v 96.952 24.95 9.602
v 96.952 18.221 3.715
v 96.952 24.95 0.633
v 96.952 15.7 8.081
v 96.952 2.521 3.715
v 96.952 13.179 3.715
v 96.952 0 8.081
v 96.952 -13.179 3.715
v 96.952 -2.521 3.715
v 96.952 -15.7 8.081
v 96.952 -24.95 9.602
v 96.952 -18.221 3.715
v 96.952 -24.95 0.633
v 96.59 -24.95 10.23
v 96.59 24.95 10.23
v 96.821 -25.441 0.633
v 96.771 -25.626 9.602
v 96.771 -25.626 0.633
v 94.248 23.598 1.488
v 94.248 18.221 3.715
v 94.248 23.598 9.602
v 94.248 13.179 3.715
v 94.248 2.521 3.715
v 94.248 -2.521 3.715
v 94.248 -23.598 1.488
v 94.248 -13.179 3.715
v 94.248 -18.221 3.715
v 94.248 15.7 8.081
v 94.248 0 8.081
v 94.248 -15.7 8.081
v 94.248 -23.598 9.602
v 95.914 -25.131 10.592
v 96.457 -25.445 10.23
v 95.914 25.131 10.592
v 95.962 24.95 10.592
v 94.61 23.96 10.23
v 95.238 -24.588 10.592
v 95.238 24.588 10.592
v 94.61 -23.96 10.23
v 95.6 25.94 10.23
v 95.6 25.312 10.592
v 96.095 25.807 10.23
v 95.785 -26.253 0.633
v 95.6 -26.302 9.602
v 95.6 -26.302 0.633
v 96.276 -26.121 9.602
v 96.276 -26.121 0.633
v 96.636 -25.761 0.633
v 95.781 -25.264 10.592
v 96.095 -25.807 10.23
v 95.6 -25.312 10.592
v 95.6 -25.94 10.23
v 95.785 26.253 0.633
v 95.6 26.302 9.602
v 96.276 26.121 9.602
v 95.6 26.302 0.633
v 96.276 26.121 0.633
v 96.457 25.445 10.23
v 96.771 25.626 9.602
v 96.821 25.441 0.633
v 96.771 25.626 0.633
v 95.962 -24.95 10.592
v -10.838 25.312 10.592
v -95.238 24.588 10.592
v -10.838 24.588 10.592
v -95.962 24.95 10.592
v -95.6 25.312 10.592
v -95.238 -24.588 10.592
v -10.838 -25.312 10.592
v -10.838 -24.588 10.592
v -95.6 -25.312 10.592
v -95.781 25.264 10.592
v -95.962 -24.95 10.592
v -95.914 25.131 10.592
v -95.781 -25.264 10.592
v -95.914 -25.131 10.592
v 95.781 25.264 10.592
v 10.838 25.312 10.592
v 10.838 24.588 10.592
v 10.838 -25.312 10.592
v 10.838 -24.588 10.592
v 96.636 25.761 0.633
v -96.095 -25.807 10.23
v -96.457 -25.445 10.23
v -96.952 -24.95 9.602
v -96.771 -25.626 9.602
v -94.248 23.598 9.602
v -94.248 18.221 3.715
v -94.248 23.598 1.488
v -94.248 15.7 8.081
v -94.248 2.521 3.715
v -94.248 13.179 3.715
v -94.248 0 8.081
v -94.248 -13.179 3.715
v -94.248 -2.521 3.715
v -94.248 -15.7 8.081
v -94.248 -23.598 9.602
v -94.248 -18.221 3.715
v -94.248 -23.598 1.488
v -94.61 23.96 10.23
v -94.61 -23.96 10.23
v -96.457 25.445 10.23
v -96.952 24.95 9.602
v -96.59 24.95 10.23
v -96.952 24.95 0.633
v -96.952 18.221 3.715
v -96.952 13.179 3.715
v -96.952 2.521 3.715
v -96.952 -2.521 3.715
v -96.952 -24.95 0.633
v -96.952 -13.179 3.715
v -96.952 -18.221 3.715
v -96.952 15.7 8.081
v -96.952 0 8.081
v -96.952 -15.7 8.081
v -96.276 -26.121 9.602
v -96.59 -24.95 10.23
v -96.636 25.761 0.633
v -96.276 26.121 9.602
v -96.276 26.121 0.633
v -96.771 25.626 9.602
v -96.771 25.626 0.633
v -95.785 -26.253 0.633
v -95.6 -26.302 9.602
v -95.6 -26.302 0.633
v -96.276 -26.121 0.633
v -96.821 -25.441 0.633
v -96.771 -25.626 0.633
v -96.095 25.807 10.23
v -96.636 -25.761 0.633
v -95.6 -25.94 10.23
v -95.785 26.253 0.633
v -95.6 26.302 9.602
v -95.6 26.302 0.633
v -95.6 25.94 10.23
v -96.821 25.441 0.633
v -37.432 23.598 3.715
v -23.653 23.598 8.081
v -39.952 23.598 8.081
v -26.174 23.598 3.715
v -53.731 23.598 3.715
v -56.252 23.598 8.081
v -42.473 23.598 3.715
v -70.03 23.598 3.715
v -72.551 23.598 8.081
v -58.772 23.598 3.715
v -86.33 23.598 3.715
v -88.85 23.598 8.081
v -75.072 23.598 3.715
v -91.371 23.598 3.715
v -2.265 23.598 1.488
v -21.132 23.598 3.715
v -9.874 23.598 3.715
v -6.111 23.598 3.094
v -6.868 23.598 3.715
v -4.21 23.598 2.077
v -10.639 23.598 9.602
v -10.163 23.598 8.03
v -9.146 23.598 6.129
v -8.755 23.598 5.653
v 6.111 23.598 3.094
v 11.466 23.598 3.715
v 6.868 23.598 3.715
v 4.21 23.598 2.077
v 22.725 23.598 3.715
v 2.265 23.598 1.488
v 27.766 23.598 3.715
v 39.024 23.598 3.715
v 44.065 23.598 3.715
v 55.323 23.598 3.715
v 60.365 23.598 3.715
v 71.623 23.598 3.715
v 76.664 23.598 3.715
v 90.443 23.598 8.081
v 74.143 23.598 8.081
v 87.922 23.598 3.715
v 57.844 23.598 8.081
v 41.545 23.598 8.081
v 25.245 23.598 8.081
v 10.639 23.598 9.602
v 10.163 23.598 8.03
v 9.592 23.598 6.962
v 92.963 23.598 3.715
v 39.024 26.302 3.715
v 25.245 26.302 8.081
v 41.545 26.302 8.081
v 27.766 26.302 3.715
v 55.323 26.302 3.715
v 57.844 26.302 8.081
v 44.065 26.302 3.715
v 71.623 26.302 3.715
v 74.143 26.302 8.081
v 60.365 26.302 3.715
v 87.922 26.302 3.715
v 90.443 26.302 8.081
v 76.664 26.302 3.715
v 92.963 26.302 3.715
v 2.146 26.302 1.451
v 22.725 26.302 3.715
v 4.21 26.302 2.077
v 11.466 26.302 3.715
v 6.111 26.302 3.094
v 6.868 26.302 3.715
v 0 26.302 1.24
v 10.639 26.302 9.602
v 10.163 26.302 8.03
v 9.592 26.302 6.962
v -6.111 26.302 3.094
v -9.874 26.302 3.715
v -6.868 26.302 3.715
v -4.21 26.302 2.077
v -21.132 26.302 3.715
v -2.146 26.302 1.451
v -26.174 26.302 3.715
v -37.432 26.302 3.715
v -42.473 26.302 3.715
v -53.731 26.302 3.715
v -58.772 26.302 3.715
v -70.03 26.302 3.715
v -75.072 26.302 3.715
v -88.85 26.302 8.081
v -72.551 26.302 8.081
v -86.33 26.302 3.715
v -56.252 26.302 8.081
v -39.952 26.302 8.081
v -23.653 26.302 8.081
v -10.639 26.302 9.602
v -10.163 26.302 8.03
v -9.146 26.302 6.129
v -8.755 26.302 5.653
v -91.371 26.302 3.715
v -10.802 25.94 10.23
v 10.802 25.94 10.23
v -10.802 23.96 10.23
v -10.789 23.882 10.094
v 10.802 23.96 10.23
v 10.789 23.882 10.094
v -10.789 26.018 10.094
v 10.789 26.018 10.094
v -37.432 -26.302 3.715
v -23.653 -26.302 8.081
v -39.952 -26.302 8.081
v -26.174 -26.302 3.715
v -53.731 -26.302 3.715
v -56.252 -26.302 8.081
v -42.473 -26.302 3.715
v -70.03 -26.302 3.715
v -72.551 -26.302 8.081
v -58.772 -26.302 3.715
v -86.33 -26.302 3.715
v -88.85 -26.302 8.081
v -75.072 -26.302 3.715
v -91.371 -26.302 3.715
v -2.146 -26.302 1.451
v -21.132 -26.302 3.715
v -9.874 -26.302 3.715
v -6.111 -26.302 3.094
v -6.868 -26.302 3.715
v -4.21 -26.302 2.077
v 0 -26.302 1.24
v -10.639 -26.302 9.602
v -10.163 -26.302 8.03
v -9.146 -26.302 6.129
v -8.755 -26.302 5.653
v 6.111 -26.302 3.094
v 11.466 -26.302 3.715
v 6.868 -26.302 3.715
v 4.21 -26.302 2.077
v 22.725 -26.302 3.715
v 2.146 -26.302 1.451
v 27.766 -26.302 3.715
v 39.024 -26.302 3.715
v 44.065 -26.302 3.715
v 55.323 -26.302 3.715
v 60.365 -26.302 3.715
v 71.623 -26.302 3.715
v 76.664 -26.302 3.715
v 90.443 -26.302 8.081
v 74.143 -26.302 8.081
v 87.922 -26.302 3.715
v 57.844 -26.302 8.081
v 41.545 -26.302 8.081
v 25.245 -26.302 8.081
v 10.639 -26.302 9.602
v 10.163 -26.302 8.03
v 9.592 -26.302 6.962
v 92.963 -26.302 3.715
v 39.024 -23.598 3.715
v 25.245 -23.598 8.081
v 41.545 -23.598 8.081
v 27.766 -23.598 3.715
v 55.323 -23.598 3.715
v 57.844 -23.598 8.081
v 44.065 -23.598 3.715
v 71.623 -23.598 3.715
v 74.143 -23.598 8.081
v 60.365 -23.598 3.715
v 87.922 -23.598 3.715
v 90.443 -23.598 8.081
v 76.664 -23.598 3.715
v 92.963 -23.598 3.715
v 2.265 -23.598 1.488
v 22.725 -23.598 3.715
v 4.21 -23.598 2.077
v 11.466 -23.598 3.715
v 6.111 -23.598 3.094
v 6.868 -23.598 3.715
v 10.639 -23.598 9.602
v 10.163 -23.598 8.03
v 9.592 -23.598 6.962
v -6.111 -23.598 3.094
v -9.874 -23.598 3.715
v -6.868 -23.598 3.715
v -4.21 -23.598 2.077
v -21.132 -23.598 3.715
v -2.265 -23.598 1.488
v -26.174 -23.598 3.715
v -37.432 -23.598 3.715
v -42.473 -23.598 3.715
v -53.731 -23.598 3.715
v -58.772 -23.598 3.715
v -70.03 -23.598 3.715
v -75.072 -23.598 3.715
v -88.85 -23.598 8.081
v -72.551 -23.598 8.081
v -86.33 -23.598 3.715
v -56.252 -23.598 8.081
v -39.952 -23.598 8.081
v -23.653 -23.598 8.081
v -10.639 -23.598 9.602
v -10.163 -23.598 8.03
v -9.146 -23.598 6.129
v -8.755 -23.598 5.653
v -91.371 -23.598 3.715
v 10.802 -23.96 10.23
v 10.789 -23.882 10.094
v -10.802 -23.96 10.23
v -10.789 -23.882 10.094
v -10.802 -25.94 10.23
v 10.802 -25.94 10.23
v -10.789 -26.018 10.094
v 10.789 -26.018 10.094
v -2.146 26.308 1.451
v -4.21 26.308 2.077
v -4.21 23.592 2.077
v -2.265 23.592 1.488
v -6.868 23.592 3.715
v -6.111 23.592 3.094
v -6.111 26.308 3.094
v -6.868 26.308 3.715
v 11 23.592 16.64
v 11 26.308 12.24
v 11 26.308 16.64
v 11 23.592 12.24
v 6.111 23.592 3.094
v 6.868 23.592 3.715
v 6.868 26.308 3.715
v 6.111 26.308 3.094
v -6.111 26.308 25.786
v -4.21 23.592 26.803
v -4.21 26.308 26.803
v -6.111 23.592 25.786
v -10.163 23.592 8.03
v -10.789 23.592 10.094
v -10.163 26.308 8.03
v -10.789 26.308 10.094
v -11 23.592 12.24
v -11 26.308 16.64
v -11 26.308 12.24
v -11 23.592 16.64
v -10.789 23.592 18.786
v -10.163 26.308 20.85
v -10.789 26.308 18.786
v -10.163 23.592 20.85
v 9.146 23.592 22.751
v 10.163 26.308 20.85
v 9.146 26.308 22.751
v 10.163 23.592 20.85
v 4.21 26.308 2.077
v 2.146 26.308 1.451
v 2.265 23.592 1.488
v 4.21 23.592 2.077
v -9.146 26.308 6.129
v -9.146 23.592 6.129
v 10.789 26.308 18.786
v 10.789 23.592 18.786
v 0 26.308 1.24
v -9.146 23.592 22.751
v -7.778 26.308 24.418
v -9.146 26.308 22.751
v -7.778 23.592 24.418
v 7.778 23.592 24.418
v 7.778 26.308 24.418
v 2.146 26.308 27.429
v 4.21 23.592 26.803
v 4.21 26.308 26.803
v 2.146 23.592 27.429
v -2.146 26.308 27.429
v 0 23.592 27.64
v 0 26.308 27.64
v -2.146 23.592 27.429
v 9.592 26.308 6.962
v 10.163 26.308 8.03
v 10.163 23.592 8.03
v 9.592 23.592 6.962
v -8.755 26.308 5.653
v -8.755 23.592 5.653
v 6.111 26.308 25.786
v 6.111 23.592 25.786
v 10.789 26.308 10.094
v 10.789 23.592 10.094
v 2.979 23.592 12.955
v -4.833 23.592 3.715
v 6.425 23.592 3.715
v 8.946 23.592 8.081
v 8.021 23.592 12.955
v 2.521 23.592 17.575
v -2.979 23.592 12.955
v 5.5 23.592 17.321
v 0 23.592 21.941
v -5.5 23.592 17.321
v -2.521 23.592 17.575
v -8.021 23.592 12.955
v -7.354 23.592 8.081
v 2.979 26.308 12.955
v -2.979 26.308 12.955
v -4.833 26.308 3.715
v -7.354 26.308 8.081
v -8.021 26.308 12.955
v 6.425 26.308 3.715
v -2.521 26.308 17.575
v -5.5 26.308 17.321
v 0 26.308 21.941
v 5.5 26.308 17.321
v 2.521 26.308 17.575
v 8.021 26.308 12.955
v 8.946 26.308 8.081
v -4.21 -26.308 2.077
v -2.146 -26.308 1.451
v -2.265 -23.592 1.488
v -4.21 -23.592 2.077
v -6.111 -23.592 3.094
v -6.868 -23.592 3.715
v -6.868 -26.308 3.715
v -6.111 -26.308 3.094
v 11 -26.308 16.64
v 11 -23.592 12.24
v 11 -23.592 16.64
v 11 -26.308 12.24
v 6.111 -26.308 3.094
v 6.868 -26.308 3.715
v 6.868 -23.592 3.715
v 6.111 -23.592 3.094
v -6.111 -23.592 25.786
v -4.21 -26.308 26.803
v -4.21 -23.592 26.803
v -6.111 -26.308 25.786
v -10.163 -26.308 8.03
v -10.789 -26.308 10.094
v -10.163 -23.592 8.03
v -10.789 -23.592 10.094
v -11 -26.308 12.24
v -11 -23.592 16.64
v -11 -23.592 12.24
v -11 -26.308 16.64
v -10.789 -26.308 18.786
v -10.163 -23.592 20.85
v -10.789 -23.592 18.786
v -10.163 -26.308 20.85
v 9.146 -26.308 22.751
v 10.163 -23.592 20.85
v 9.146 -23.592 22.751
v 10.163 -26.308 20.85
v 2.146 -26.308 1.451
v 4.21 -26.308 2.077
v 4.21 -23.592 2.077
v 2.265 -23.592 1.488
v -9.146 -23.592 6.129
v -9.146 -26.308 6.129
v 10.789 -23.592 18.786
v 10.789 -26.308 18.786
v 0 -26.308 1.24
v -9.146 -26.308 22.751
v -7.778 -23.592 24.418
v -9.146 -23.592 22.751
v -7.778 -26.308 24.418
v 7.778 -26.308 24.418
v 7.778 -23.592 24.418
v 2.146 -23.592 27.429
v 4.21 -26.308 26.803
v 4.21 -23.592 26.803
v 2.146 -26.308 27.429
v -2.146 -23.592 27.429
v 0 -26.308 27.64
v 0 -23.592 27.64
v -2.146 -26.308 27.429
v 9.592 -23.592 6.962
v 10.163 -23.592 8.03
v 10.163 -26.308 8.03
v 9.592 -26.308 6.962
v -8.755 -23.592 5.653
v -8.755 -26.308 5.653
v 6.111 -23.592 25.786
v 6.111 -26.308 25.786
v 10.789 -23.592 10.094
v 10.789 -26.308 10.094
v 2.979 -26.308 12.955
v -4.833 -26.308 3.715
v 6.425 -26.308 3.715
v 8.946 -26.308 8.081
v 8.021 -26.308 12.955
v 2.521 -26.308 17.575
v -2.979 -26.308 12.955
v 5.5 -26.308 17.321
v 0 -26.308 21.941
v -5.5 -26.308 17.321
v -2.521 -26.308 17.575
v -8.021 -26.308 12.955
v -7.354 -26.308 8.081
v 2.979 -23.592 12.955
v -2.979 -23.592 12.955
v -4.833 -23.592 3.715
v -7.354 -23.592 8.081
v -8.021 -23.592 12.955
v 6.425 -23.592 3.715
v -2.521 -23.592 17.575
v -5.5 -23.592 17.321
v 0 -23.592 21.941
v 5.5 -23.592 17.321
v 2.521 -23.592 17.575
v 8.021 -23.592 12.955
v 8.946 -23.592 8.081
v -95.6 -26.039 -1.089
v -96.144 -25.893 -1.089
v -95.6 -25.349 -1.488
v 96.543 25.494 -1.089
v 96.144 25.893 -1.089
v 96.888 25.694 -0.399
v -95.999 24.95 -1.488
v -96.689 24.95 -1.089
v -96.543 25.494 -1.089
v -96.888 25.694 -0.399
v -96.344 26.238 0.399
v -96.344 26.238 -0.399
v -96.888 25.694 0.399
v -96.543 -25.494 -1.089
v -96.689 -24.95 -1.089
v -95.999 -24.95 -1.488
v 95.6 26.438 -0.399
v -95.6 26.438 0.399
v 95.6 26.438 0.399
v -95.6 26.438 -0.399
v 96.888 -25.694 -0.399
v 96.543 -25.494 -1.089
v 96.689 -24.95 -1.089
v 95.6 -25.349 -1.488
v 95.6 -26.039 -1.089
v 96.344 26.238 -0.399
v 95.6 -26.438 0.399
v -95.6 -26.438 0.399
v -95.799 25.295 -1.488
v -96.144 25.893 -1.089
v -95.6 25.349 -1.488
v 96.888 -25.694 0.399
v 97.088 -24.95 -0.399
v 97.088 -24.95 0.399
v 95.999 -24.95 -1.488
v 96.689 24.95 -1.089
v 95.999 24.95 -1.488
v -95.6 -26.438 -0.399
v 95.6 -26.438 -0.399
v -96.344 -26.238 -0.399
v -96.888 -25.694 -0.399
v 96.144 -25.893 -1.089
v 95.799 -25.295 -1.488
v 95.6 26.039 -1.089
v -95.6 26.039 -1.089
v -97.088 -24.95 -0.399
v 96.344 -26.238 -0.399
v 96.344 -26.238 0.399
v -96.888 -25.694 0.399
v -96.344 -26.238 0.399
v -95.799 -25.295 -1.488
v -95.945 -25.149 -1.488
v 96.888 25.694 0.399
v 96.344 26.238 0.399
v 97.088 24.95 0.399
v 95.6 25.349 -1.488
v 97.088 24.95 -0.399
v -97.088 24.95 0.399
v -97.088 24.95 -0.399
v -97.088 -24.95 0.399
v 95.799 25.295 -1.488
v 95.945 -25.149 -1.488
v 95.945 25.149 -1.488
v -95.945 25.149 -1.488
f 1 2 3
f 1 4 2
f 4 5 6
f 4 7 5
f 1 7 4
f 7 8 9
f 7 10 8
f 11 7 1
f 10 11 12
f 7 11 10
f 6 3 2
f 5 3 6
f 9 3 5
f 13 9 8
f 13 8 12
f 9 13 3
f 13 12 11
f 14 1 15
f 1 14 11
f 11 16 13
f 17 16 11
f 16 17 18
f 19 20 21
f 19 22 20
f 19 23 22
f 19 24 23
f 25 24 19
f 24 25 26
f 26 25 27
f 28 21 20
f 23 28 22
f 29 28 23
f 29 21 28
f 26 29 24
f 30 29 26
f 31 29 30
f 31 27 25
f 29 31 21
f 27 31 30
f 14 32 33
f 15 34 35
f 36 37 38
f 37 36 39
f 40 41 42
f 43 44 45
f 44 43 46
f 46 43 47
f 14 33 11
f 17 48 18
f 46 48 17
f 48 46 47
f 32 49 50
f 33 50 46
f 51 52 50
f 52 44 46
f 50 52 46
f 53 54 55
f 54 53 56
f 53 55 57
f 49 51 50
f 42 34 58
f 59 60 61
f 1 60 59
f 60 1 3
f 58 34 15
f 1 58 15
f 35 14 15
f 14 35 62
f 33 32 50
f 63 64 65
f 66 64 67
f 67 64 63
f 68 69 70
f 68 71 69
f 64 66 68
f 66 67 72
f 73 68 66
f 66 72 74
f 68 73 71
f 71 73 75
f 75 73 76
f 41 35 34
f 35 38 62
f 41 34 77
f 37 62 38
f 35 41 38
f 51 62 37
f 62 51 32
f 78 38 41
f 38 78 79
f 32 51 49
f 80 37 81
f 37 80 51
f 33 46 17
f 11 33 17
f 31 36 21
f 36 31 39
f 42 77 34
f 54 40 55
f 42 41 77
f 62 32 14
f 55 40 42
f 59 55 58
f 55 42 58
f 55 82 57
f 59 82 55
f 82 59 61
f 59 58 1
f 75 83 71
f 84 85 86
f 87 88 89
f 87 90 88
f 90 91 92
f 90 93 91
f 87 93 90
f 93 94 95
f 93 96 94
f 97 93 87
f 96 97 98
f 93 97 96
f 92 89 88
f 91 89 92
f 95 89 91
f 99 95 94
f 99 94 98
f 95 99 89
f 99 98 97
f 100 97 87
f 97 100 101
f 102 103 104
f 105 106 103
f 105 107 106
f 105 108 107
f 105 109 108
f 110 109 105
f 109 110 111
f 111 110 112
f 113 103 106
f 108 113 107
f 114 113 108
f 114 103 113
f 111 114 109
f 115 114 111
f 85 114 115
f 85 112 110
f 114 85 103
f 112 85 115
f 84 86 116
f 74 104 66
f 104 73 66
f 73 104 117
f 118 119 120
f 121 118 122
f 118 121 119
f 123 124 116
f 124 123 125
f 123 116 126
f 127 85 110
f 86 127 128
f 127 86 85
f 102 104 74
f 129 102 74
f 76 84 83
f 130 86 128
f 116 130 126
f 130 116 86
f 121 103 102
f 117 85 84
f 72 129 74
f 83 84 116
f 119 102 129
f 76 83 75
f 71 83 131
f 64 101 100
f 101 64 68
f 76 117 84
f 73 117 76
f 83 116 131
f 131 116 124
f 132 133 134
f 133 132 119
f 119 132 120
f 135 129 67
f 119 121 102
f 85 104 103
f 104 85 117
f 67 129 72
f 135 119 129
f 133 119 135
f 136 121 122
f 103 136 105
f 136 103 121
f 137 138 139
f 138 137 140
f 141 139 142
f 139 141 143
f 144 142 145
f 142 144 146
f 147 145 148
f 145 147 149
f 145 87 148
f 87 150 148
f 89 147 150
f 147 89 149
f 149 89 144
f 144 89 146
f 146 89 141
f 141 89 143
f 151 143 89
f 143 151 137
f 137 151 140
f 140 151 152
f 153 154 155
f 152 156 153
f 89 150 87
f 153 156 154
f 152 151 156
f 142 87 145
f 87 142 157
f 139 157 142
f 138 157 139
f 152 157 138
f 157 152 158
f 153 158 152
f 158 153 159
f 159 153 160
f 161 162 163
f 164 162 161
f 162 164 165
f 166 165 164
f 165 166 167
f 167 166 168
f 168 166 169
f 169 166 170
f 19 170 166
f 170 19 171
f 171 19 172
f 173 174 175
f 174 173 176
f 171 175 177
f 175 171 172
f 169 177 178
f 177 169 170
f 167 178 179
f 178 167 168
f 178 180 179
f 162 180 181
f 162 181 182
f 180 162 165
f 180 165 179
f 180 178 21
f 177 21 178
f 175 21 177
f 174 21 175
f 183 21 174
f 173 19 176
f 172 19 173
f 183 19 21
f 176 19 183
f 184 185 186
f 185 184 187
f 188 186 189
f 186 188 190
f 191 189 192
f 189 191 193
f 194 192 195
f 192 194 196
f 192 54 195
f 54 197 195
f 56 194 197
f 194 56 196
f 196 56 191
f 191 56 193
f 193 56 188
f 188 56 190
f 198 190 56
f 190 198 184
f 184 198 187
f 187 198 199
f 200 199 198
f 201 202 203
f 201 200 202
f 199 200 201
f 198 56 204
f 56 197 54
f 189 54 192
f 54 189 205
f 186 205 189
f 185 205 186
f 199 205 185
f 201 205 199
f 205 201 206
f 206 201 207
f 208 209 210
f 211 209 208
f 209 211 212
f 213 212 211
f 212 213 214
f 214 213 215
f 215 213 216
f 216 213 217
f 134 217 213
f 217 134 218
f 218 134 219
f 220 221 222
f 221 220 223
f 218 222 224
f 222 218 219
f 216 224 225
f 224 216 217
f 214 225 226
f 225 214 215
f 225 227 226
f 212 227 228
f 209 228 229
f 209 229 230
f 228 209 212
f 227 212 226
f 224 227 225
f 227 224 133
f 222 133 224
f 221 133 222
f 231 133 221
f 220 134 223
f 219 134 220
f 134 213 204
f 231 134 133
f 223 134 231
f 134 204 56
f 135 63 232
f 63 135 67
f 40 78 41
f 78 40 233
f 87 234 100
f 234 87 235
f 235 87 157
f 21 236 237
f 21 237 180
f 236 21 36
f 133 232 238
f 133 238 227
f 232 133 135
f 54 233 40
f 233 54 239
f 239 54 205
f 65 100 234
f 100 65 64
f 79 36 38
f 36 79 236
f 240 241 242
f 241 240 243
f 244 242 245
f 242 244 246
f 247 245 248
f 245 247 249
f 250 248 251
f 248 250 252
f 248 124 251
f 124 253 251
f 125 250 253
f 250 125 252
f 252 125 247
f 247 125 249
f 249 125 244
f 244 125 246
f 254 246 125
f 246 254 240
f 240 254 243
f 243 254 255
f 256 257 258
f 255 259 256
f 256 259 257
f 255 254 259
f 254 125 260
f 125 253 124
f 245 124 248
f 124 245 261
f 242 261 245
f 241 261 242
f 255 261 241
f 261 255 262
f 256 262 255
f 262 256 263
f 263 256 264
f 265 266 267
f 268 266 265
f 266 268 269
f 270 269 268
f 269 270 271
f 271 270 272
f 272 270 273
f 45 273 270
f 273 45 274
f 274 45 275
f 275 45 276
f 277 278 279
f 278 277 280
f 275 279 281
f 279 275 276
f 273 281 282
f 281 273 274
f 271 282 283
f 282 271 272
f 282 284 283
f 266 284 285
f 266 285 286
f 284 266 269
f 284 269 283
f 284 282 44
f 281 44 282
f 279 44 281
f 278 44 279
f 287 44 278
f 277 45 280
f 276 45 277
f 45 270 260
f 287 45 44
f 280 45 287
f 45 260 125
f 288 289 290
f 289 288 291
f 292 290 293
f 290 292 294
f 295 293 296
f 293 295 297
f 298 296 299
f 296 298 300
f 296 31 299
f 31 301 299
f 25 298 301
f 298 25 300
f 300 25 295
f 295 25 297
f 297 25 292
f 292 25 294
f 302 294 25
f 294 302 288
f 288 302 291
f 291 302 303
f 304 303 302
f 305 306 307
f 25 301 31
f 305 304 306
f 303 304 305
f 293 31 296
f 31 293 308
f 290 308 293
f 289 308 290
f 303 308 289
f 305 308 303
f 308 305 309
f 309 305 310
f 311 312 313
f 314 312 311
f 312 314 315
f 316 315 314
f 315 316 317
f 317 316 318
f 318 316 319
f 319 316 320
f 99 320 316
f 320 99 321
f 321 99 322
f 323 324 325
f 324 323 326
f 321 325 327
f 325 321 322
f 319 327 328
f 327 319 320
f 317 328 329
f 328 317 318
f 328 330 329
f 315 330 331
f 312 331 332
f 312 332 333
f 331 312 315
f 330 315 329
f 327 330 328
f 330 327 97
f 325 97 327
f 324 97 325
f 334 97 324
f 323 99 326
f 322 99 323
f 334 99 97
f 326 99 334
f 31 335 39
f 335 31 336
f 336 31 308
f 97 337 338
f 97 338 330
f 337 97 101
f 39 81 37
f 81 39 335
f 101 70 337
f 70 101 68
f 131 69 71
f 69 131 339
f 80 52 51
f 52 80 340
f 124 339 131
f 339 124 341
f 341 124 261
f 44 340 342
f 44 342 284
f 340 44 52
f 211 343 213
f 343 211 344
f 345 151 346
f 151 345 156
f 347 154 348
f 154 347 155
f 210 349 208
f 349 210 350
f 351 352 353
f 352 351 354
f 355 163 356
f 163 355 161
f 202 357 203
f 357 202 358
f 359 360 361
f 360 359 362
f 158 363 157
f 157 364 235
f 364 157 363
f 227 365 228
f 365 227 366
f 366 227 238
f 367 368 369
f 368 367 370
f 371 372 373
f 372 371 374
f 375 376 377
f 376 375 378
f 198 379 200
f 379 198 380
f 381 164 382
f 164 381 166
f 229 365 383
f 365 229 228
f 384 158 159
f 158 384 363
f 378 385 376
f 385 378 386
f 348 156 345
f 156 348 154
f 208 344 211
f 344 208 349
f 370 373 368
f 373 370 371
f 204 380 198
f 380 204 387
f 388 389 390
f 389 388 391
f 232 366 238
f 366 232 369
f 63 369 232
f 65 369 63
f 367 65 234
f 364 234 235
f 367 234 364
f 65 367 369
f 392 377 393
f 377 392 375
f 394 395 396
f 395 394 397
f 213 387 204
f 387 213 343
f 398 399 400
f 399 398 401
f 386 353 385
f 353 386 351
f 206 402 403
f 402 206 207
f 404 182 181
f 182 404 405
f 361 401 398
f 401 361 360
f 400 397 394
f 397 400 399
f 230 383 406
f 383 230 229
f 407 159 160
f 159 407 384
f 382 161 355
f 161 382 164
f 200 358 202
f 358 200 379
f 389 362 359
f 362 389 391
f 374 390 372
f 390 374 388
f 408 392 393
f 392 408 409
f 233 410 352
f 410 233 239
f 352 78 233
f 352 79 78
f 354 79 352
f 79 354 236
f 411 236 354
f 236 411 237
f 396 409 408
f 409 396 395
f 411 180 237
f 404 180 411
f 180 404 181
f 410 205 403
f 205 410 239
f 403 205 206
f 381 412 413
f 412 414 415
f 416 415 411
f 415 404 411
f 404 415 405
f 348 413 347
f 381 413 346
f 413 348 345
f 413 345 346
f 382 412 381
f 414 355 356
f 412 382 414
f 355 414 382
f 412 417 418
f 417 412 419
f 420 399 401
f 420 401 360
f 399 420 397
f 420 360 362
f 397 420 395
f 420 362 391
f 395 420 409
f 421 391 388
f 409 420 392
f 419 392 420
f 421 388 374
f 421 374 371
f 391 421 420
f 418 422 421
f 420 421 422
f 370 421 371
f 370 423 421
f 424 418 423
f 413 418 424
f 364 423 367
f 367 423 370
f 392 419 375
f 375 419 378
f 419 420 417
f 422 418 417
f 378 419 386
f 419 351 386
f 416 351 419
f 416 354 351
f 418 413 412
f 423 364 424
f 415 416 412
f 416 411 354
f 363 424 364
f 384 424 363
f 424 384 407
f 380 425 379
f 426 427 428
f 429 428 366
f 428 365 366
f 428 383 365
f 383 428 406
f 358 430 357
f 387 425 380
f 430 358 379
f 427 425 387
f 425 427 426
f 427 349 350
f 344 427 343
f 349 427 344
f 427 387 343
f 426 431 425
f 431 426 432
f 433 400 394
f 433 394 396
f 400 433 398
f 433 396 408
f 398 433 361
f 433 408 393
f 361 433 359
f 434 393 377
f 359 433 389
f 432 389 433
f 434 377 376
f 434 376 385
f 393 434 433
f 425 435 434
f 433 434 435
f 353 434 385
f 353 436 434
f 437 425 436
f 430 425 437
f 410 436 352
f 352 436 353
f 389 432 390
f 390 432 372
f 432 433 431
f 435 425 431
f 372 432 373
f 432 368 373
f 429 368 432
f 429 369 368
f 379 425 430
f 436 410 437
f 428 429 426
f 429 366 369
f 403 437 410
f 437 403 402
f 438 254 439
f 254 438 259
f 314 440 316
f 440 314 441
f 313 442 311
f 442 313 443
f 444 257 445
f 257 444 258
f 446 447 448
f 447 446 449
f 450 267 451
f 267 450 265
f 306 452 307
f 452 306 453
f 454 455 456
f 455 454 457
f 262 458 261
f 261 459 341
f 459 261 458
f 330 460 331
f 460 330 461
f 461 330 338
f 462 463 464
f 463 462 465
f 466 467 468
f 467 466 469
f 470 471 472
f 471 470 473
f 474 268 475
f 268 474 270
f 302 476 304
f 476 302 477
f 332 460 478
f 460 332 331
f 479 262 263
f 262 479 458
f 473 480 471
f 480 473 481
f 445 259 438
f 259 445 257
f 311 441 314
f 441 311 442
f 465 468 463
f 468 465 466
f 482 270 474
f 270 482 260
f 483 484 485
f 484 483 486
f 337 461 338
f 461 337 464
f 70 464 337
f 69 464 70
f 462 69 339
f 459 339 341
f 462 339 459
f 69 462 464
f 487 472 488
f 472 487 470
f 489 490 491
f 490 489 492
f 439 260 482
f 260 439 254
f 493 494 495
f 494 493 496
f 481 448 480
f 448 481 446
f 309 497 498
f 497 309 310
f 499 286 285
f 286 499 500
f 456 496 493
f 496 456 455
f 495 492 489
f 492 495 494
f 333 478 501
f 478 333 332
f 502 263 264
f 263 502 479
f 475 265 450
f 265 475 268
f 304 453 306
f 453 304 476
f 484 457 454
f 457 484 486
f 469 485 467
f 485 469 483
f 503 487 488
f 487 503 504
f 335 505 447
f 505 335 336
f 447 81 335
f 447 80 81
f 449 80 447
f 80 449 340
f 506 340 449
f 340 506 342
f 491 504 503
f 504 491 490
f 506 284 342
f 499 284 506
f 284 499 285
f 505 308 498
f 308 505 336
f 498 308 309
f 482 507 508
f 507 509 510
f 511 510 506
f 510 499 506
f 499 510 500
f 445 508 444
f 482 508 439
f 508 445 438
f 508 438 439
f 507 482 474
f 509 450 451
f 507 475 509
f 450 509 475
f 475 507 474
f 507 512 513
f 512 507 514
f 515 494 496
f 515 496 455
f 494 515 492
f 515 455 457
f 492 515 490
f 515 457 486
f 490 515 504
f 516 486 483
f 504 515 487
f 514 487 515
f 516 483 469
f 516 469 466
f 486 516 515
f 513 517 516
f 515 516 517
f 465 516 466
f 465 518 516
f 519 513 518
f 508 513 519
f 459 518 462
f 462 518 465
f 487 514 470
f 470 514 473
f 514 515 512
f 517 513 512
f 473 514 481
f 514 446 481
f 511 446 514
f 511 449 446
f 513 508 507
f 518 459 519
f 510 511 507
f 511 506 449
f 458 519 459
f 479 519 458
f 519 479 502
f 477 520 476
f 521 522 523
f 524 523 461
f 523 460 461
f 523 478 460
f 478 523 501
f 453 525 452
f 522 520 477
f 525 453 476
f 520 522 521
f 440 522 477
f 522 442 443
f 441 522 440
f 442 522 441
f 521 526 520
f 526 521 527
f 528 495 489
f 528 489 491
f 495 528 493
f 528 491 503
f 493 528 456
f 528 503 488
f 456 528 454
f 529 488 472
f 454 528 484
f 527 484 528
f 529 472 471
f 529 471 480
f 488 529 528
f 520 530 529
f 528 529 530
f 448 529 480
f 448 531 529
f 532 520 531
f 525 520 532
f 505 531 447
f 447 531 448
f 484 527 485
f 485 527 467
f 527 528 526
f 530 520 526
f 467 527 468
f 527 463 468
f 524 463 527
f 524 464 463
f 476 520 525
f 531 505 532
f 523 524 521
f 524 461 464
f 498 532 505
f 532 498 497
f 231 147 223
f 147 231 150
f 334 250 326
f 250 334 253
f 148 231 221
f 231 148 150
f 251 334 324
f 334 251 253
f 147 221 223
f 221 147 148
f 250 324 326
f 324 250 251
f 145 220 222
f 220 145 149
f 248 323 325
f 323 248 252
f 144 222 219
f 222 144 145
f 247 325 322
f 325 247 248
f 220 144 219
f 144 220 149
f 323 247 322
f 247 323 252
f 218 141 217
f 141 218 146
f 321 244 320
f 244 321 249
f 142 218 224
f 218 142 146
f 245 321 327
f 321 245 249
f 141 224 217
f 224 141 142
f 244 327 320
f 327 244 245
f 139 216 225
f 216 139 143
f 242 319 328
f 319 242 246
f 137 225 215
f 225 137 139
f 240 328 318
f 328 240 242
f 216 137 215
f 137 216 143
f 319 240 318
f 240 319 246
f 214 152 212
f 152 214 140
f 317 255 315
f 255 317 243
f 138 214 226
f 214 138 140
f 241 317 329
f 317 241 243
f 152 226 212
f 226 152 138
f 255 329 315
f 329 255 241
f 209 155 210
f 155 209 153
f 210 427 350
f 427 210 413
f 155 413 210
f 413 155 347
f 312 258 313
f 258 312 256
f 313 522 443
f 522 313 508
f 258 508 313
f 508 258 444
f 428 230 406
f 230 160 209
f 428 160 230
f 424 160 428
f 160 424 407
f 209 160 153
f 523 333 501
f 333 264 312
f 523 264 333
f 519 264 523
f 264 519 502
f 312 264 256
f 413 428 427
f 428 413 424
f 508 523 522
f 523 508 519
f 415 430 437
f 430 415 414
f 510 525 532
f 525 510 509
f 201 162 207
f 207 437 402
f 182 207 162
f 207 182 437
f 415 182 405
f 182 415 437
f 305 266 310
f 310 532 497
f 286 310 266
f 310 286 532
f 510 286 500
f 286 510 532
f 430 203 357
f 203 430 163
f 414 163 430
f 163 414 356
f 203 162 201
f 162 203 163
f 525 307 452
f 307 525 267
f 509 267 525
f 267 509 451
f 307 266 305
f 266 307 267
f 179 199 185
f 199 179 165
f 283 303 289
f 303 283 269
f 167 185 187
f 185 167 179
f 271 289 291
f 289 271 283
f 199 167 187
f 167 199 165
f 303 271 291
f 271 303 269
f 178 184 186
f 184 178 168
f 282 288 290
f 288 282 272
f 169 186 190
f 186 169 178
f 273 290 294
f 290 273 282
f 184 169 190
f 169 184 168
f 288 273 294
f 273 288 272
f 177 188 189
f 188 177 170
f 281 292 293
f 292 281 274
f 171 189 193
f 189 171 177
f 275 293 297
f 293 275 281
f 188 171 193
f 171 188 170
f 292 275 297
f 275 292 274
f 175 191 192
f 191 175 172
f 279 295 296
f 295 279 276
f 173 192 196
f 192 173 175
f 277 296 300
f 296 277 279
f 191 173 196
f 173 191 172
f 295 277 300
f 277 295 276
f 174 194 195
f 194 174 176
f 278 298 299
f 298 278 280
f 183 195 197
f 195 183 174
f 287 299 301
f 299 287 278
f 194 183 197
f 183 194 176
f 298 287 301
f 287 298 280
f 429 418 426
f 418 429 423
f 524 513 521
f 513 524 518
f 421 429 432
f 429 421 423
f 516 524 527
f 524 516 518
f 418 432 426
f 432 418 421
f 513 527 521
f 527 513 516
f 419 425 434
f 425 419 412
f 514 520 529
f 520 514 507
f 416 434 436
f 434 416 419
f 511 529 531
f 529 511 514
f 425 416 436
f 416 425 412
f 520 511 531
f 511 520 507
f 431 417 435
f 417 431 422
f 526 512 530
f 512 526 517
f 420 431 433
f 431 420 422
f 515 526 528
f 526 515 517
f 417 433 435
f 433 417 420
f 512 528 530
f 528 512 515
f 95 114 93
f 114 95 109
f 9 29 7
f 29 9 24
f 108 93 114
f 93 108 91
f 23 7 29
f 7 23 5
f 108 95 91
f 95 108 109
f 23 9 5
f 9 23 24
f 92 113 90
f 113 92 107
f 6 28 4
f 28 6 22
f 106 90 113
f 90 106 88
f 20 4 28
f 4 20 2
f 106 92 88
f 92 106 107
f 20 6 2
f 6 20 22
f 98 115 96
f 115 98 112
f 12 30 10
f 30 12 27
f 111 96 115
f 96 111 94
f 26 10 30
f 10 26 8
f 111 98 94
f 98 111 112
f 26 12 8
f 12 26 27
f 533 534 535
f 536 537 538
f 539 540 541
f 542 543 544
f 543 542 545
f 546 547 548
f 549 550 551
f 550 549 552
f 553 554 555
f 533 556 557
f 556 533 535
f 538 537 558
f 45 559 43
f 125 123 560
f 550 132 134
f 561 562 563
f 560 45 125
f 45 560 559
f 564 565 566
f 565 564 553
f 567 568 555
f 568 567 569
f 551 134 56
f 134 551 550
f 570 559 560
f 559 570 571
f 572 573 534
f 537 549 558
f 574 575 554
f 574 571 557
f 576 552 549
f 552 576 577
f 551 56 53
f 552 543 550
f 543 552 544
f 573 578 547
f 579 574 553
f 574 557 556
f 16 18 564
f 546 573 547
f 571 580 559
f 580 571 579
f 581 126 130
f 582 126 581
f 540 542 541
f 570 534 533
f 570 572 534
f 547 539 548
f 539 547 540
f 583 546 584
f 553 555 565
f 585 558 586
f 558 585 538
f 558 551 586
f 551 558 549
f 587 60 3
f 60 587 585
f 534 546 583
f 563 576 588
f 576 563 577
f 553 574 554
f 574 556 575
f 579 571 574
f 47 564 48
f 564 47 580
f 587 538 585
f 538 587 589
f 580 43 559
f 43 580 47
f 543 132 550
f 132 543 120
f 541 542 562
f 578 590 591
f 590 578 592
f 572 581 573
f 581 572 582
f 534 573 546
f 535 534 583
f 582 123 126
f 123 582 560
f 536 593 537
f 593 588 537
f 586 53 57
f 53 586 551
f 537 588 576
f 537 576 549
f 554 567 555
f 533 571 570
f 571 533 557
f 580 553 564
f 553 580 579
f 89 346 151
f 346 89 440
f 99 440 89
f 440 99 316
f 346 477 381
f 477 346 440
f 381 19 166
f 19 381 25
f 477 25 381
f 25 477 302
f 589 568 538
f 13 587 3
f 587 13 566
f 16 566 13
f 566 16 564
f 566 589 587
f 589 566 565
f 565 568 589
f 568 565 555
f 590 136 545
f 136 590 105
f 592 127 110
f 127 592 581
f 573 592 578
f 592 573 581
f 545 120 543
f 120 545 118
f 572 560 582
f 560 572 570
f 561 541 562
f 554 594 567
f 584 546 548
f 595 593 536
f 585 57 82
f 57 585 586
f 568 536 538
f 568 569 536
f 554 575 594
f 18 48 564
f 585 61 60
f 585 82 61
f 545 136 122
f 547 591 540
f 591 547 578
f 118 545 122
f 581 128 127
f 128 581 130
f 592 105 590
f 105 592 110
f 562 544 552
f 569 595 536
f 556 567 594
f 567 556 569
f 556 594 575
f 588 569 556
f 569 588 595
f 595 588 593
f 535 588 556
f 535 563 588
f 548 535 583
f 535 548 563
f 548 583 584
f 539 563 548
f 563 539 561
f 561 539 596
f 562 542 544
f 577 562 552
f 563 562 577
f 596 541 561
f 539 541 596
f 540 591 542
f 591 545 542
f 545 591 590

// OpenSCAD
//
// blockbox.scad

// 12 blocks by 3
//
// block height  33mm
//       side    15mm

// unit is mm

$fn=12;


block_height = 33;
block_side = 15;

wall_thickness = 2.8;
wall_height = block_height * 0.28;

gap = 0.70;
box_in_length = 12 * (block_side + gap);
box_ex_length = box_in_length + 2 * wall_thickness;

box_in_width = 3 * (block_side + gap);
box_ex_width = box_in_width + 2 * wall_thickness;

echo("box_in_width", box_in_width);
echo("box_in_length", box_in_length);

border_radius = wall_thickness / 2 * 1.1;

wt2 = wall_thickness / 2;
el2 = box_ex_length * 0.5 - wt2;
ew2 = box_ex_width * 0.5 - wt2;


hull() { // bottom
  translate([  el2,  ew2, 0 ]) sphere(r=border_radius);
  translate([  el2, -ew2, 0 ]) sphere(r=border_radius);
  translate([ -el2,  ew2, 0 ]) sphere(r=border_radius);
  translate([ -el2, -ew2, 0 ]) sphere(r=border_radius);
};

rad = wall_height * 0.63 / 2;

module remo0() {
  dh = border_radius / 2.8 + wall_height / 2;
  l = box_ex_length * 1.1;
  translate([ 0, l / 2, dh ]) rotate([ 90, 30, 0 ]) cylinder(r=rad, h=l, $fn=3);
  //translate([ 0, l / 2, dh ]) rotate([ 90, 0, 0 ]) cylinder(r=rad, h=l, $fn=12);
  //translate([ 0, l / 2, dh * 0.8 ]) rotate([ 90, 45, 0 ]) cylinder(r=rad, h=l, $fn=4);
};
module remo1() {
  rotate([ 0, 0, 90 ]) remo0();
}

handle_radius = 11;

module handle() {

  wh = wall_height + 3;
  hh = block_height * 0.8 - handle_radius * 2;

  hull() {
    translate([ 0, 0, wh ]) rotate([ 90, 0, 0 ])
      cylinder(r=handle_radius, h=wall_thickness * 0.97, $fn=32, center=true);
    translate([ 0, 0, wh + hh ]) rotate([ 90, 0, 0 ])
      cylinder(r=handle_radius, h=wall_thickness * 0.97, $fn=32, center=true);
  }
};

difference() {
  union() {
    hull() {
      translate([ el2,  ew2, 0 ]) sphere(r=wt2);
      translate([ el2, -ew2, 0 ]) sphere(r=wt2);
      translate([ el2,  ew2, wall_height ]) sphere(r=wt2);
      translate([ el2, -ew2, wall_height ]) sphere(r=wt2);
    };
    hull() {
      translate([ -el2,  ew2, 0 ]) sphere(r=wt2);
      translate([ -el2, -ew2, 0 ]) sphere(r=wt2);
      translate([ -el2,  ew2, wall_height ]) sphere(r=wt2);
      translate([ -el2, -ew2, wall_height ]) sphere(r=wt2);
    };
    hull() {
      translate([  el2,  ew2, 0 ]) sphere(r=wt2);
      translate([ -el2,  ew2, 0 ]) sphere(r=wt2);
      translate([  el2,  ew2, wall_height ]) sphere(r=wt2);
      translate([ -el2,  ew2, wall_height ]) sphere(r=wt2);
    };
    hull() {
      translate([  el2,  -ew2, 0 ]) sphere(r=wt2);
      translate([ -el2,  -ew2, 0 ]) sphere(r=wt2);
      translate([  el2,  -ew2, wall_height ]) sphere(r=wt2);
      translate([ -el2,  -ew2, wall_height ]) sphere(r=wt2);
    };
    translate([ 0,  ew2, 0 ]) handle();
    translate([ 0, -ew2, 0 ]) handle();
  };

  rad4 = rad * 5.6;

  for (x = [ -box_ex_length / 2 + rad * 2.8 : rad4 : box_ex_length / 2 ]) {
    translate([ x, 0, 0 ]) remo0();
  }

  hr2 = handle_radius / 2;
  translate([ -hr2, 0, block_height * 0.28 ]) remo0();
  translate([  hr2, 0, block_height * 0.28 ]) remo0();
  translate([  0, 0, block_height * 0.42 ]) remo0();

  y = box_in_width / 3;
  remo1();
  translate([ 0,  y, 0 ]) remo1();
  translate([ 0, -y, 0 ]) remo1();
};
